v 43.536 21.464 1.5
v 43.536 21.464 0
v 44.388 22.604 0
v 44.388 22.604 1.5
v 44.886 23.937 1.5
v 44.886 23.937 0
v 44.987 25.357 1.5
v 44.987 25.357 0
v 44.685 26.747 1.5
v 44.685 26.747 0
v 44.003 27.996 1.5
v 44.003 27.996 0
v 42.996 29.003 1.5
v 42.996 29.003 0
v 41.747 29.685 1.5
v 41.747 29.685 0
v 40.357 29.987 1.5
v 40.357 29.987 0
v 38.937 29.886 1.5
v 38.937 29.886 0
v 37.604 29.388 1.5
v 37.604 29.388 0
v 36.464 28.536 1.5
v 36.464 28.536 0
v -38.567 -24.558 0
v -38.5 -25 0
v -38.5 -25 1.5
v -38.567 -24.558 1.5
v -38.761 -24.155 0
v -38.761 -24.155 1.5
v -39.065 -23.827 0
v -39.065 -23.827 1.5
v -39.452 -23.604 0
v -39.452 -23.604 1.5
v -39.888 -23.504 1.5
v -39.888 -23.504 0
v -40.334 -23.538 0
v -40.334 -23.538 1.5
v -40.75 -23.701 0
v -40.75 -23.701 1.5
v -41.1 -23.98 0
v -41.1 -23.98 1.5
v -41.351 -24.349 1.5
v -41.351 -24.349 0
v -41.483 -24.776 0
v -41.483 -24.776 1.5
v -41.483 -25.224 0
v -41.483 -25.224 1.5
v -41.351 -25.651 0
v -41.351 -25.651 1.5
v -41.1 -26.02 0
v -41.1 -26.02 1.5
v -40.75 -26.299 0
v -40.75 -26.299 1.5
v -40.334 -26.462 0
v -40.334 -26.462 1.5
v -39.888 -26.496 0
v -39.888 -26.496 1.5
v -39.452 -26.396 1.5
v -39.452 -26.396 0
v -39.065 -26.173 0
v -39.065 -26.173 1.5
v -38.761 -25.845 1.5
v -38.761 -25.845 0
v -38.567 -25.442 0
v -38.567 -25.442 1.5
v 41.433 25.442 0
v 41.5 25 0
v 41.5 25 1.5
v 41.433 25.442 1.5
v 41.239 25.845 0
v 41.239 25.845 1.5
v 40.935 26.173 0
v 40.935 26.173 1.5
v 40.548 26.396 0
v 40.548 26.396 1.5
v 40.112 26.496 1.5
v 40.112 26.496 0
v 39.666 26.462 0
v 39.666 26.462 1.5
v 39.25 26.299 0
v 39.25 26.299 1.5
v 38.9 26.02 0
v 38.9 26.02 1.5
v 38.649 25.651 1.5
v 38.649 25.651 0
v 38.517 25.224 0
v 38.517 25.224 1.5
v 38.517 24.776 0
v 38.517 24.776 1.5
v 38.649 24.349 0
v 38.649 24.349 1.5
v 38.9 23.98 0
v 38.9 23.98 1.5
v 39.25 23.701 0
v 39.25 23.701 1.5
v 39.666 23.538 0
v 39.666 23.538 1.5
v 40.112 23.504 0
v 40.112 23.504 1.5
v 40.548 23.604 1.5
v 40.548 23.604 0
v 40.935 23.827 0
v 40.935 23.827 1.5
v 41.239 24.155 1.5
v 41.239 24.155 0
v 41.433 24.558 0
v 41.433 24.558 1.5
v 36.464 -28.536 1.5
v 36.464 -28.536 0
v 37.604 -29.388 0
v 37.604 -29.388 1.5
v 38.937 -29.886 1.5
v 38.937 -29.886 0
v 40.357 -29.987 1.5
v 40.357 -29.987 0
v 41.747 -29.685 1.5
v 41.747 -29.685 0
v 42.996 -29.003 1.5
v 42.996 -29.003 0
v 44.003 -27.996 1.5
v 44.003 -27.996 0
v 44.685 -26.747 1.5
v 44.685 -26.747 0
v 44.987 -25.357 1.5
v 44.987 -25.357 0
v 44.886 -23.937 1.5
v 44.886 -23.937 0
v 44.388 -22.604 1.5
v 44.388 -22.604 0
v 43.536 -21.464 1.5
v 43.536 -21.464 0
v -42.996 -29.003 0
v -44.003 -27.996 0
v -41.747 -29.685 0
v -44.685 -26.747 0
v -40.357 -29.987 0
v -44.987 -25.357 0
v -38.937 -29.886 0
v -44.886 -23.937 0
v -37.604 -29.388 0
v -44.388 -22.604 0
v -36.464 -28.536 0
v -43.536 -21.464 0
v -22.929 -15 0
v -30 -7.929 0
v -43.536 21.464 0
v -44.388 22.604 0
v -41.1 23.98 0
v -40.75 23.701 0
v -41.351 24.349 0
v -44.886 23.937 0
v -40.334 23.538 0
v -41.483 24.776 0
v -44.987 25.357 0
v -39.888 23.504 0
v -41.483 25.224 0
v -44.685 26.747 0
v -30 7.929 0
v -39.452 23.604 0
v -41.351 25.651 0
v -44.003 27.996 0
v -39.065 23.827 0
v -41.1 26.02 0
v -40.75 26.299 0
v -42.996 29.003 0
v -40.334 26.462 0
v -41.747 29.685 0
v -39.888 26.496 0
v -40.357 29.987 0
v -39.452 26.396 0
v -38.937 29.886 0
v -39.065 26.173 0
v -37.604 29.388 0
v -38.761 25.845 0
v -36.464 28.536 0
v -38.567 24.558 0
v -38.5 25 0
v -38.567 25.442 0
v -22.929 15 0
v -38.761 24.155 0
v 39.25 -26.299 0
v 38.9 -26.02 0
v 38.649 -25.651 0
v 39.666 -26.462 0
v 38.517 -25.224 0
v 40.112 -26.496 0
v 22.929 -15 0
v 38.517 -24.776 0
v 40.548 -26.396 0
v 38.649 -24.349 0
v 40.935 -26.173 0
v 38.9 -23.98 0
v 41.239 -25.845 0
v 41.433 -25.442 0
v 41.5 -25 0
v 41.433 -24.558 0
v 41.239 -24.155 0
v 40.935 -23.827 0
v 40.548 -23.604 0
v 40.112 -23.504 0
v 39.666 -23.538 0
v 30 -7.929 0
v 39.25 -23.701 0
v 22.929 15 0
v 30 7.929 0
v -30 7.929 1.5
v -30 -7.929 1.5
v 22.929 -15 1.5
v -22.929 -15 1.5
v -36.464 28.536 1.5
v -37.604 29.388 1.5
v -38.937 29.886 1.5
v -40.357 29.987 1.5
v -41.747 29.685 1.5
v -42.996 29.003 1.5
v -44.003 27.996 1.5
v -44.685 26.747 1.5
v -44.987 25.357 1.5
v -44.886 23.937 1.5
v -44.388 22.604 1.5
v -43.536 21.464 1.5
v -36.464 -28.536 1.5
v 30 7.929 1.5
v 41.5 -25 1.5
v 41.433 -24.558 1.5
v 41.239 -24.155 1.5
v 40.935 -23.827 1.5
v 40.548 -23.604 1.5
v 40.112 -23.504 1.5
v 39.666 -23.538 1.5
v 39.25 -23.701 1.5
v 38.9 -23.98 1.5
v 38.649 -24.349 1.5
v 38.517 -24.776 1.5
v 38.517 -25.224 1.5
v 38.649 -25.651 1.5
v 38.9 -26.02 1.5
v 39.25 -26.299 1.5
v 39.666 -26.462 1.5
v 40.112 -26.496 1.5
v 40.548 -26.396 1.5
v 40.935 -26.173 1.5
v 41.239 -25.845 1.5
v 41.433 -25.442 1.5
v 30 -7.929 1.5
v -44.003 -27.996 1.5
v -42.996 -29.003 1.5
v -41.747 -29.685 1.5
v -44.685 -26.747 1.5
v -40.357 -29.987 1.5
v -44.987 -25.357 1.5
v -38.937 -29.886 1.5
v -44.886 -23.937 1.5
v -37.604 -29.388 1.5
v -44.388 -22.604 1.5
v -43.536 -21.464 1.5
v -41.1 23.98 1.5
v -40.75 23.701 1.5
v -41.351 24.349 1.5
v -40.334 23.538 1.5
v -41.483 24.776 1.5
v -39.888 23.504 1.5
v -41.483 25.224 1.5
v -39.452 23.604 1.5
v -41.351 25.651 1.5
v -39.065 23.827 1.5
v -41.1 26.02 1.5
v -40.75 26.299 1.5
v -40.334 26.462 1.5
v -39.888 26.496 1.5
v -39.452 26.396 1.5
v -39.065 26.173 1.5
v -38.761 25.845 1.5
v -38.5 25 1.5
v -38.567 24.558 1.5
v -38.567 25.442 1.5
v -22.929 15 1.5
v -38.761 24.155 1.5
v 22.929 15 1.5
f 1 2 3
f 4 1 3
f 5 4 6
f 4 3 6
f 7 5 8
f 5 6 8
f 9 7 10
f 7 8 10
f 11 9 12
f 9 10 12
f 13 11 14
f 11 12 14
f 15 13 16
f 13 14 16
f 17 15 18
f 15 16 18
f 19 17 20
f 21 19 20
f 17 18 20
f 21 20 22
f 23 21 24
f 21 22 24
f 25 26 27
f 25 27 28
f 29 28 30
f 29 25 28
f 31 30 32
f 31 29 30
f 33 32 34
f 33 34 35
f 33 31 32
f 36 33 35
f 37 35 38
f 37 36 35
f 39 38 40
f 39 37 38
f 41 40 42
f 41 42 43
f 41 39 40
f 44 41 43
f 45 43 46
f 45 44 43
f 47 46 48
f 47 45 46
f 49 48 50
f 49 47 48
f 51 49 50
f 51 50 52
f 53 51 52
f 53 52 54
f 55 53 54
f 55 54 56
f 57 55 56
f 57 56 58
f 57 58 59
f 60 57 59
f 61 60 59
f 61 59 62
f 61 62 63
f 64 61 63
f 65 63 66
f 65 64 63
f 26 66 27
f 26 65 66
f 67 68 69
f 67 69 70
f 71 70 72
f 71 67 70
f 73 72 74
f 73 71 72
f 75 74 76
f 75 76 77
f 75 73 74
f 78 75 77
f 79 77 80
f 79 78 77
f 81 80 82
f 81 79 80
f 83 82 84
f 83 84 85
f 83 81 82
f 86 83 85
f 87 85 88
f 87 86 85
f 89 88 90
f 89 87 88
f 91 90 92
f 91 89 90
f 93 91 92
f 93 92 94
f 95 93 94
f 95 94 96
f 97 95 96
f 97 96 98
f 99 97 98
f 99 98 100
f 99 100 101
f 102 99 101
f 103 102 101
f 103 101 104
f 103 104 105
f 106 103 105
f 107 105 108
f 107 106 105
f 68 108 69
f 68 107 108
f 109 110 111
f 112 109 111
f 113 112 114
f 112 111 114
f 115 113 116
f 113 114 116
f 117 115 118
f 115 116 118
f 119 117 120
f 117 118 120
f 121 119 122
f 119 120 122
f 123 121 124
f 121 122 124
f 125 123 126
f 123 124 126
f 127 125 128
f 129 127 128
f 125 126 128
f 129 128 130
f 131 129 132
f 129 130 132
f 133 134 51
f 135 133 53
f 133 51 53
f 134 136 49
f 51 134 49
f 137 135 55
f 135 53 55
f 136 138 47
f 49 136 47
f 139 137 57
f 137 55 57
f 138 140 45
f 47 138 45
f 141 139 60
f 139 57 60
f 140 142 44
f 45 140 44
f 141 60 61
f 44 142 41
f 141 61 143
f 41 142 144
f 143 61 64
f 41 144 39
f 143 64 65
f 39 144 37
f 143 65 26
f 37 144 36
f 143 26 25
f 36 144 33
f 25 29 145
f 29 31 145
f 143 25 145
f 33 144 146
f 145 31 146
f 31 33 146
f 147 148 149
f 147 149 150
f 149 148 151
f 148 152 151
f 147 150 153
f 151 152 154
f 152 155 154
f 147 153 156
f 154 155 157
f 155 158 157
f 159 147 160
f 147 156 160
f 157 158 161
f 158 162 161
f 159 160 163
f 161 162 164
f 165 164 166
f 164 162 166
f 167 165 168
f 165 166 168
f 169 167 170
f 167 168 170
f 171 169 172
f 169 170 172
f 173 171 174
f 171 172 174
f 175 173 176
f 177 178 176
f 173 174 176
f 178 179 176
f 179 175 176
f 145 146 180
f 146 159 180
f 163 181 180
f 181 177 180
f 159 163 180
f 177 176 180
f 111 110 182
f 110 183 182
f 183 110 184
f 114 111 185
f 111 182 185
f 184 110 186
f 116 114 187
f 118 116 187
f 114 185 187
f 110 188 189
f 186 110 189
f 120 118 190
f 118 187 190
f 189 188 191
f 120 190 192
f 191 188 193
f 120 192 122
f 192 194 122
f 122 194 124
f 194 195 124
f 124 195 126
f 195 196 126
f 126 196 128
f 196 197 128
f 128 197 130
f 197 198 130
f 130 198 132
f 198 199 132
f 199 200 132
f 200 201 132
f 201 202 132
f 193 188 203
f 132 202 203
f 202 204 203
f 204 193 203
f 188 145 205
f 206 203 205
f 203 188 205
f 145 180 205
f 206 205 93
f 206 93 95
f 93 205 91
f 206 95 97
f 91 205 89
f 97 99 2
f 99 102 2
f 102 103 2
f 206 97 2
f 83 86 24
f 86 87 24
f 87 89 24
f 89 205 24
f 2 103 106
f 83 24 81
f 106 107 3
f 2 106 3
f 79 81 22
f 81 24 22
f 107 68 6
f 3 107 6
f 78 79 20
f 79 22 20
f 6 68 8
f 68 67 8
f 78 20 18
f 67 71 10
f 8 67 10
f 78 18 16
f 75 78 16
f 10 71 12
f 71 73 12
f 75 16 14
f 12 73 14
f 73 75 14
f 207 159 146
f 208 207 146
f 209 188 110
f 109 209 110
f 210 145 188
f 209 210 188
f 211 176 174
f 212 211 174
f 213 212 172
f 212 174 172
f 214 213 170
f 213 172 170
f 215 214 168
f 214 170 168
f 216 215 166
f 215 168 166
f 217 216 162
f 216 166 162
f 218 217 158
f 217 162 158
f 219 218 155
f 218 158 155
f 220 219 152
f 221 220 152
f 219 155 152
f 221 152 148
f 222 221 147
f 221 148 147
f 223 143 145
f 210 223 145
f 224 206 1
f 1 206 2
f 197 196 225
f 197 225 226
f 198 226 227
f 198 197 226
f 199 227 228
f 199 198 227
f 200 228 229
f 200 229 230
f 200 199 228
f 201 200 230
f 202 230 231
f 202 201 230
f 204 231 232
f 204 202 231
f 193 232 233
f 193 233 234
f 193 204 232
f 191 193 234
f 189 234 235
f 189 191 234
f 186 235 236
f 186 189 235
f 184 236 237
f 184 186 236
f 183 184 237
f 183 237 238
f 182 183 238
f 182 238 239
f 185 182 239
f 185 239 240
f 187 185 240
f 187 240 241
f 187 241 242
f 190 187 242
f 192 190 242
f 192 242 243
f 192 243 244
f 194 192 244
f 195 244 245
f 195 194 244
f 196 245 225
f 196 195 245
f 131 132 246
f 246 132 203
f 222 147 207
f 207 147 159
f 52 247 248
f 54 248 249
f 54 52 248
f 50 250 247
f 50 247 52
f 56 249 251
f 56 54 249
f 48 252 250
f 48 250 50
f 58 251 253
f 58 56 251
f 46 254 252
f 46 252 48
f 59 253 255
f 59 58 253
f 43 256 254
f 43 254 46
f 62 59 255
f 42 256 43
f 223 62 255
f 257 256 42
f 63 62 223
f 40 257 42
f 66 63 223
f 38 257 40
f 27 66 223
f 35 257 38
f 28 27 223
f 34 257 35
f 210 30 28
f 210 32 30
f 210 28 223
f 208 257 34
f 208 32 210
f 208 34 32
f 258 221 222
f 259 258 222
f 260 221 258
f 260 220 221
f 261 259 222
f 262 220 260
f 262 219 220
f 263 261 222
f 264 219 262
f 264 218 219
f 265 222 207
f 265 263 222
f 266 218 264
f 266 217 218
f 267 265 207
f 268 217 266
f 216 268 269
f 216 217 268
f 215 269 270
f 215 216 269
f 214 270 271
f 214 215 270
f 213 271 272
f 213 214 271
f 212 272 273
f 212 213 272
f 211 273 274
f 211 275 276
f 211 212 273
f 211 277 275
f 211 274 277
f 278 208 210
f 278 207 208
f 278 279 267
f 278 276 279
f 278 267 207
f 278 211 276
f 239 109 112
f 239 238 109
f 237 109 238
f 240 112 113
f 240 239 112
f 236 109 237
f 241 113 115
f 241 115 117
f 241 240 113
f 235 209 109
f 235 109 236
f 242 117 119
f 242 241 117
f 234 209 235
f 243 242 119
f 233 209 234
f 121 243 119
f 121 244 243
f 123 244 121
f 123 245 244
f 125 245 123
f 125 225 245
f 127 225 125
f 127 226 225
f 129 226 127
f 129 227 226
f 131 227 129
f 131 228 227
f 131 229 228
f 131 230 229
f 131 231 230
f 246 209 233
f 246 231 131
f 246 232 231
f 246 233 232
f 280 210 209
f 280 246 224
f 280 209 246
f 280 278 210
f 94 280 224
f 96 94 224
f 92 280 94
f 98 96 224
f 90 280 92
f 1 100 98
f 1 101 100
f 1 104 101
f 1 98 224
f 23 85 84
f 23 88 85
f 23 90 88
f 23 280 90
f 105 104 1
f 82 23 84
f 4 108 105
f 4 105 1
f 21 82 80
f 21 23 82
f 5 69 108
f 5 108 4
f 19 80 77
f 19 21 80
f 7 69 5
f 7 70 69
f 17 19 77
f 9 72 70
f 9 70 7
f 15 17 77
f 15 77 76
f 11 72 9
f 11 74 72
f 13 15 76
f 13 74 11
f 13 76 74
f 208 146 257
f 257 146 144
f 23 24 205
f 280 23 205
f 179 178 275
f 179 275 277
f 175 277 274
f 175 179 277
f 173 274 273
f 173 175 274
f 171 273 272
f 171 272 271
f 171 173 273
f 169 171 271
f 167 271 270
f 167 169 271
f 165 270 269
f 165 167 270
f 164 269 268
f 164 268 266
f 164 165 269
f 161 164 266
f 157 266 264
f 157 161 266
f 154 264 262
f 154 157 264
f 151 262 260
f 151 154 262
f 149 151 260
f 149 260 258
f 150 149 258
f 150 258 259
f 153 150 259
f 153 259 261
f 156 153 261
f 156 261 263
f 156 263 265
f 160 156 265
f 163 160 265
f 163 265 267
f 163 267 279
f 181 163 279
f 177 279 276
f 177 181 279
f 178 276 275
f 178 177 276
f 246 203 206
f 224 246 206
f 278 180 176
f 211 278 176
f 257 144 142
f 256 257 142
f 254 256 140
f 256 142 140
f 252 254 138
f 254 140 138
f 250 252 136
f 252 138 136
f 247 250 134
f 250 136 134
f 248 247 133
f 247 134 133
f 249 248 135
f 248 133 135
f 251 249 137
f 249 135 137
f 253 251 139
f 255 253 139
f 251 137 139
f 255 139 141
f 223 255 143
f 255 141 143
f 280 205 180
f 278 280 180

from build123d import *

# Parameters (mm, degrees)
SKETCH_1_R      = 1.5
EXTRUDE_1_DEPTH = 1.5


with BuildPart() as part:
    # 草图1 → 凸台-拉伸1 (new body)
    with BuildSketch(Plane.XY):
        with BuildLine():
            Line((-43.535533906, 21.464466094), (-30, 7.928932188))
            Line((-30, 7.928932188), (-30, -7.928932188))
            Line((-30, -7.928932188), (-43.535533906, -21.464466094))
            ThreePointArc((-43.535533906, -21.464466094), (-43.535533906, -28.535533906), (-36.464466094, -28.535533906))
            Line((-36.464466094, -28.535533906), (-22.928933621, -15.000001433))
            Line((-22.928933621, -15.000001433), (22.928933621, -15.000001433))
            Line((22.928933621, -15.000001433), (36.464466094, -28.535533906))
            ThreePointArc((36.464466094, -28.535533906), (43.535533906, -28.535533906), (43.535533906, -21.464466094))
            Line((43.535533906, -21.464466094), (30, -7.928932188))
            Line((30, -7.928932188), (30, 7.928932188))
            Line((30, 7.928932188), (43.535533906, 21.464466094))
            ThreePointArc((43.535533906, 21.464466094), (43.535533906, 28.535533906), (36.464466094, 28.535533906))
            Line((36.464466094, 28.535533906), (22.928933621, 15.000001433))
            Line((22.928933621, 15.000001433), (-22.928933621, 15.000001433))
            Line((-22.928933621, 15.000001433), (-36.464466094, 28.535533906))
            ThreePointArc((-36.464466094, 28.535533906), (-43.535533906, 28.535533906), (-43.535533906, 21.464466094))
        make_face()
        with Locations((-40, 25)):
            Circle(SKETCH_1_R, mode=Mode.SUBTRACT)
        with Locations((40, 25)):
            Circle(SKETCH_1_R, mode=Mode.SUBTRACT)
        with Locations((40, -25)):
            Circle(SKETCH_1_R, mode=Mode.SUBTRACT)
        with Locations((-40, -25)):
            Circle(SKETCH_1_R, mode=Mode.SUBTRACT)
    extrude(amount=EXTRUDE_1_DEPTH)


solid = part.part
